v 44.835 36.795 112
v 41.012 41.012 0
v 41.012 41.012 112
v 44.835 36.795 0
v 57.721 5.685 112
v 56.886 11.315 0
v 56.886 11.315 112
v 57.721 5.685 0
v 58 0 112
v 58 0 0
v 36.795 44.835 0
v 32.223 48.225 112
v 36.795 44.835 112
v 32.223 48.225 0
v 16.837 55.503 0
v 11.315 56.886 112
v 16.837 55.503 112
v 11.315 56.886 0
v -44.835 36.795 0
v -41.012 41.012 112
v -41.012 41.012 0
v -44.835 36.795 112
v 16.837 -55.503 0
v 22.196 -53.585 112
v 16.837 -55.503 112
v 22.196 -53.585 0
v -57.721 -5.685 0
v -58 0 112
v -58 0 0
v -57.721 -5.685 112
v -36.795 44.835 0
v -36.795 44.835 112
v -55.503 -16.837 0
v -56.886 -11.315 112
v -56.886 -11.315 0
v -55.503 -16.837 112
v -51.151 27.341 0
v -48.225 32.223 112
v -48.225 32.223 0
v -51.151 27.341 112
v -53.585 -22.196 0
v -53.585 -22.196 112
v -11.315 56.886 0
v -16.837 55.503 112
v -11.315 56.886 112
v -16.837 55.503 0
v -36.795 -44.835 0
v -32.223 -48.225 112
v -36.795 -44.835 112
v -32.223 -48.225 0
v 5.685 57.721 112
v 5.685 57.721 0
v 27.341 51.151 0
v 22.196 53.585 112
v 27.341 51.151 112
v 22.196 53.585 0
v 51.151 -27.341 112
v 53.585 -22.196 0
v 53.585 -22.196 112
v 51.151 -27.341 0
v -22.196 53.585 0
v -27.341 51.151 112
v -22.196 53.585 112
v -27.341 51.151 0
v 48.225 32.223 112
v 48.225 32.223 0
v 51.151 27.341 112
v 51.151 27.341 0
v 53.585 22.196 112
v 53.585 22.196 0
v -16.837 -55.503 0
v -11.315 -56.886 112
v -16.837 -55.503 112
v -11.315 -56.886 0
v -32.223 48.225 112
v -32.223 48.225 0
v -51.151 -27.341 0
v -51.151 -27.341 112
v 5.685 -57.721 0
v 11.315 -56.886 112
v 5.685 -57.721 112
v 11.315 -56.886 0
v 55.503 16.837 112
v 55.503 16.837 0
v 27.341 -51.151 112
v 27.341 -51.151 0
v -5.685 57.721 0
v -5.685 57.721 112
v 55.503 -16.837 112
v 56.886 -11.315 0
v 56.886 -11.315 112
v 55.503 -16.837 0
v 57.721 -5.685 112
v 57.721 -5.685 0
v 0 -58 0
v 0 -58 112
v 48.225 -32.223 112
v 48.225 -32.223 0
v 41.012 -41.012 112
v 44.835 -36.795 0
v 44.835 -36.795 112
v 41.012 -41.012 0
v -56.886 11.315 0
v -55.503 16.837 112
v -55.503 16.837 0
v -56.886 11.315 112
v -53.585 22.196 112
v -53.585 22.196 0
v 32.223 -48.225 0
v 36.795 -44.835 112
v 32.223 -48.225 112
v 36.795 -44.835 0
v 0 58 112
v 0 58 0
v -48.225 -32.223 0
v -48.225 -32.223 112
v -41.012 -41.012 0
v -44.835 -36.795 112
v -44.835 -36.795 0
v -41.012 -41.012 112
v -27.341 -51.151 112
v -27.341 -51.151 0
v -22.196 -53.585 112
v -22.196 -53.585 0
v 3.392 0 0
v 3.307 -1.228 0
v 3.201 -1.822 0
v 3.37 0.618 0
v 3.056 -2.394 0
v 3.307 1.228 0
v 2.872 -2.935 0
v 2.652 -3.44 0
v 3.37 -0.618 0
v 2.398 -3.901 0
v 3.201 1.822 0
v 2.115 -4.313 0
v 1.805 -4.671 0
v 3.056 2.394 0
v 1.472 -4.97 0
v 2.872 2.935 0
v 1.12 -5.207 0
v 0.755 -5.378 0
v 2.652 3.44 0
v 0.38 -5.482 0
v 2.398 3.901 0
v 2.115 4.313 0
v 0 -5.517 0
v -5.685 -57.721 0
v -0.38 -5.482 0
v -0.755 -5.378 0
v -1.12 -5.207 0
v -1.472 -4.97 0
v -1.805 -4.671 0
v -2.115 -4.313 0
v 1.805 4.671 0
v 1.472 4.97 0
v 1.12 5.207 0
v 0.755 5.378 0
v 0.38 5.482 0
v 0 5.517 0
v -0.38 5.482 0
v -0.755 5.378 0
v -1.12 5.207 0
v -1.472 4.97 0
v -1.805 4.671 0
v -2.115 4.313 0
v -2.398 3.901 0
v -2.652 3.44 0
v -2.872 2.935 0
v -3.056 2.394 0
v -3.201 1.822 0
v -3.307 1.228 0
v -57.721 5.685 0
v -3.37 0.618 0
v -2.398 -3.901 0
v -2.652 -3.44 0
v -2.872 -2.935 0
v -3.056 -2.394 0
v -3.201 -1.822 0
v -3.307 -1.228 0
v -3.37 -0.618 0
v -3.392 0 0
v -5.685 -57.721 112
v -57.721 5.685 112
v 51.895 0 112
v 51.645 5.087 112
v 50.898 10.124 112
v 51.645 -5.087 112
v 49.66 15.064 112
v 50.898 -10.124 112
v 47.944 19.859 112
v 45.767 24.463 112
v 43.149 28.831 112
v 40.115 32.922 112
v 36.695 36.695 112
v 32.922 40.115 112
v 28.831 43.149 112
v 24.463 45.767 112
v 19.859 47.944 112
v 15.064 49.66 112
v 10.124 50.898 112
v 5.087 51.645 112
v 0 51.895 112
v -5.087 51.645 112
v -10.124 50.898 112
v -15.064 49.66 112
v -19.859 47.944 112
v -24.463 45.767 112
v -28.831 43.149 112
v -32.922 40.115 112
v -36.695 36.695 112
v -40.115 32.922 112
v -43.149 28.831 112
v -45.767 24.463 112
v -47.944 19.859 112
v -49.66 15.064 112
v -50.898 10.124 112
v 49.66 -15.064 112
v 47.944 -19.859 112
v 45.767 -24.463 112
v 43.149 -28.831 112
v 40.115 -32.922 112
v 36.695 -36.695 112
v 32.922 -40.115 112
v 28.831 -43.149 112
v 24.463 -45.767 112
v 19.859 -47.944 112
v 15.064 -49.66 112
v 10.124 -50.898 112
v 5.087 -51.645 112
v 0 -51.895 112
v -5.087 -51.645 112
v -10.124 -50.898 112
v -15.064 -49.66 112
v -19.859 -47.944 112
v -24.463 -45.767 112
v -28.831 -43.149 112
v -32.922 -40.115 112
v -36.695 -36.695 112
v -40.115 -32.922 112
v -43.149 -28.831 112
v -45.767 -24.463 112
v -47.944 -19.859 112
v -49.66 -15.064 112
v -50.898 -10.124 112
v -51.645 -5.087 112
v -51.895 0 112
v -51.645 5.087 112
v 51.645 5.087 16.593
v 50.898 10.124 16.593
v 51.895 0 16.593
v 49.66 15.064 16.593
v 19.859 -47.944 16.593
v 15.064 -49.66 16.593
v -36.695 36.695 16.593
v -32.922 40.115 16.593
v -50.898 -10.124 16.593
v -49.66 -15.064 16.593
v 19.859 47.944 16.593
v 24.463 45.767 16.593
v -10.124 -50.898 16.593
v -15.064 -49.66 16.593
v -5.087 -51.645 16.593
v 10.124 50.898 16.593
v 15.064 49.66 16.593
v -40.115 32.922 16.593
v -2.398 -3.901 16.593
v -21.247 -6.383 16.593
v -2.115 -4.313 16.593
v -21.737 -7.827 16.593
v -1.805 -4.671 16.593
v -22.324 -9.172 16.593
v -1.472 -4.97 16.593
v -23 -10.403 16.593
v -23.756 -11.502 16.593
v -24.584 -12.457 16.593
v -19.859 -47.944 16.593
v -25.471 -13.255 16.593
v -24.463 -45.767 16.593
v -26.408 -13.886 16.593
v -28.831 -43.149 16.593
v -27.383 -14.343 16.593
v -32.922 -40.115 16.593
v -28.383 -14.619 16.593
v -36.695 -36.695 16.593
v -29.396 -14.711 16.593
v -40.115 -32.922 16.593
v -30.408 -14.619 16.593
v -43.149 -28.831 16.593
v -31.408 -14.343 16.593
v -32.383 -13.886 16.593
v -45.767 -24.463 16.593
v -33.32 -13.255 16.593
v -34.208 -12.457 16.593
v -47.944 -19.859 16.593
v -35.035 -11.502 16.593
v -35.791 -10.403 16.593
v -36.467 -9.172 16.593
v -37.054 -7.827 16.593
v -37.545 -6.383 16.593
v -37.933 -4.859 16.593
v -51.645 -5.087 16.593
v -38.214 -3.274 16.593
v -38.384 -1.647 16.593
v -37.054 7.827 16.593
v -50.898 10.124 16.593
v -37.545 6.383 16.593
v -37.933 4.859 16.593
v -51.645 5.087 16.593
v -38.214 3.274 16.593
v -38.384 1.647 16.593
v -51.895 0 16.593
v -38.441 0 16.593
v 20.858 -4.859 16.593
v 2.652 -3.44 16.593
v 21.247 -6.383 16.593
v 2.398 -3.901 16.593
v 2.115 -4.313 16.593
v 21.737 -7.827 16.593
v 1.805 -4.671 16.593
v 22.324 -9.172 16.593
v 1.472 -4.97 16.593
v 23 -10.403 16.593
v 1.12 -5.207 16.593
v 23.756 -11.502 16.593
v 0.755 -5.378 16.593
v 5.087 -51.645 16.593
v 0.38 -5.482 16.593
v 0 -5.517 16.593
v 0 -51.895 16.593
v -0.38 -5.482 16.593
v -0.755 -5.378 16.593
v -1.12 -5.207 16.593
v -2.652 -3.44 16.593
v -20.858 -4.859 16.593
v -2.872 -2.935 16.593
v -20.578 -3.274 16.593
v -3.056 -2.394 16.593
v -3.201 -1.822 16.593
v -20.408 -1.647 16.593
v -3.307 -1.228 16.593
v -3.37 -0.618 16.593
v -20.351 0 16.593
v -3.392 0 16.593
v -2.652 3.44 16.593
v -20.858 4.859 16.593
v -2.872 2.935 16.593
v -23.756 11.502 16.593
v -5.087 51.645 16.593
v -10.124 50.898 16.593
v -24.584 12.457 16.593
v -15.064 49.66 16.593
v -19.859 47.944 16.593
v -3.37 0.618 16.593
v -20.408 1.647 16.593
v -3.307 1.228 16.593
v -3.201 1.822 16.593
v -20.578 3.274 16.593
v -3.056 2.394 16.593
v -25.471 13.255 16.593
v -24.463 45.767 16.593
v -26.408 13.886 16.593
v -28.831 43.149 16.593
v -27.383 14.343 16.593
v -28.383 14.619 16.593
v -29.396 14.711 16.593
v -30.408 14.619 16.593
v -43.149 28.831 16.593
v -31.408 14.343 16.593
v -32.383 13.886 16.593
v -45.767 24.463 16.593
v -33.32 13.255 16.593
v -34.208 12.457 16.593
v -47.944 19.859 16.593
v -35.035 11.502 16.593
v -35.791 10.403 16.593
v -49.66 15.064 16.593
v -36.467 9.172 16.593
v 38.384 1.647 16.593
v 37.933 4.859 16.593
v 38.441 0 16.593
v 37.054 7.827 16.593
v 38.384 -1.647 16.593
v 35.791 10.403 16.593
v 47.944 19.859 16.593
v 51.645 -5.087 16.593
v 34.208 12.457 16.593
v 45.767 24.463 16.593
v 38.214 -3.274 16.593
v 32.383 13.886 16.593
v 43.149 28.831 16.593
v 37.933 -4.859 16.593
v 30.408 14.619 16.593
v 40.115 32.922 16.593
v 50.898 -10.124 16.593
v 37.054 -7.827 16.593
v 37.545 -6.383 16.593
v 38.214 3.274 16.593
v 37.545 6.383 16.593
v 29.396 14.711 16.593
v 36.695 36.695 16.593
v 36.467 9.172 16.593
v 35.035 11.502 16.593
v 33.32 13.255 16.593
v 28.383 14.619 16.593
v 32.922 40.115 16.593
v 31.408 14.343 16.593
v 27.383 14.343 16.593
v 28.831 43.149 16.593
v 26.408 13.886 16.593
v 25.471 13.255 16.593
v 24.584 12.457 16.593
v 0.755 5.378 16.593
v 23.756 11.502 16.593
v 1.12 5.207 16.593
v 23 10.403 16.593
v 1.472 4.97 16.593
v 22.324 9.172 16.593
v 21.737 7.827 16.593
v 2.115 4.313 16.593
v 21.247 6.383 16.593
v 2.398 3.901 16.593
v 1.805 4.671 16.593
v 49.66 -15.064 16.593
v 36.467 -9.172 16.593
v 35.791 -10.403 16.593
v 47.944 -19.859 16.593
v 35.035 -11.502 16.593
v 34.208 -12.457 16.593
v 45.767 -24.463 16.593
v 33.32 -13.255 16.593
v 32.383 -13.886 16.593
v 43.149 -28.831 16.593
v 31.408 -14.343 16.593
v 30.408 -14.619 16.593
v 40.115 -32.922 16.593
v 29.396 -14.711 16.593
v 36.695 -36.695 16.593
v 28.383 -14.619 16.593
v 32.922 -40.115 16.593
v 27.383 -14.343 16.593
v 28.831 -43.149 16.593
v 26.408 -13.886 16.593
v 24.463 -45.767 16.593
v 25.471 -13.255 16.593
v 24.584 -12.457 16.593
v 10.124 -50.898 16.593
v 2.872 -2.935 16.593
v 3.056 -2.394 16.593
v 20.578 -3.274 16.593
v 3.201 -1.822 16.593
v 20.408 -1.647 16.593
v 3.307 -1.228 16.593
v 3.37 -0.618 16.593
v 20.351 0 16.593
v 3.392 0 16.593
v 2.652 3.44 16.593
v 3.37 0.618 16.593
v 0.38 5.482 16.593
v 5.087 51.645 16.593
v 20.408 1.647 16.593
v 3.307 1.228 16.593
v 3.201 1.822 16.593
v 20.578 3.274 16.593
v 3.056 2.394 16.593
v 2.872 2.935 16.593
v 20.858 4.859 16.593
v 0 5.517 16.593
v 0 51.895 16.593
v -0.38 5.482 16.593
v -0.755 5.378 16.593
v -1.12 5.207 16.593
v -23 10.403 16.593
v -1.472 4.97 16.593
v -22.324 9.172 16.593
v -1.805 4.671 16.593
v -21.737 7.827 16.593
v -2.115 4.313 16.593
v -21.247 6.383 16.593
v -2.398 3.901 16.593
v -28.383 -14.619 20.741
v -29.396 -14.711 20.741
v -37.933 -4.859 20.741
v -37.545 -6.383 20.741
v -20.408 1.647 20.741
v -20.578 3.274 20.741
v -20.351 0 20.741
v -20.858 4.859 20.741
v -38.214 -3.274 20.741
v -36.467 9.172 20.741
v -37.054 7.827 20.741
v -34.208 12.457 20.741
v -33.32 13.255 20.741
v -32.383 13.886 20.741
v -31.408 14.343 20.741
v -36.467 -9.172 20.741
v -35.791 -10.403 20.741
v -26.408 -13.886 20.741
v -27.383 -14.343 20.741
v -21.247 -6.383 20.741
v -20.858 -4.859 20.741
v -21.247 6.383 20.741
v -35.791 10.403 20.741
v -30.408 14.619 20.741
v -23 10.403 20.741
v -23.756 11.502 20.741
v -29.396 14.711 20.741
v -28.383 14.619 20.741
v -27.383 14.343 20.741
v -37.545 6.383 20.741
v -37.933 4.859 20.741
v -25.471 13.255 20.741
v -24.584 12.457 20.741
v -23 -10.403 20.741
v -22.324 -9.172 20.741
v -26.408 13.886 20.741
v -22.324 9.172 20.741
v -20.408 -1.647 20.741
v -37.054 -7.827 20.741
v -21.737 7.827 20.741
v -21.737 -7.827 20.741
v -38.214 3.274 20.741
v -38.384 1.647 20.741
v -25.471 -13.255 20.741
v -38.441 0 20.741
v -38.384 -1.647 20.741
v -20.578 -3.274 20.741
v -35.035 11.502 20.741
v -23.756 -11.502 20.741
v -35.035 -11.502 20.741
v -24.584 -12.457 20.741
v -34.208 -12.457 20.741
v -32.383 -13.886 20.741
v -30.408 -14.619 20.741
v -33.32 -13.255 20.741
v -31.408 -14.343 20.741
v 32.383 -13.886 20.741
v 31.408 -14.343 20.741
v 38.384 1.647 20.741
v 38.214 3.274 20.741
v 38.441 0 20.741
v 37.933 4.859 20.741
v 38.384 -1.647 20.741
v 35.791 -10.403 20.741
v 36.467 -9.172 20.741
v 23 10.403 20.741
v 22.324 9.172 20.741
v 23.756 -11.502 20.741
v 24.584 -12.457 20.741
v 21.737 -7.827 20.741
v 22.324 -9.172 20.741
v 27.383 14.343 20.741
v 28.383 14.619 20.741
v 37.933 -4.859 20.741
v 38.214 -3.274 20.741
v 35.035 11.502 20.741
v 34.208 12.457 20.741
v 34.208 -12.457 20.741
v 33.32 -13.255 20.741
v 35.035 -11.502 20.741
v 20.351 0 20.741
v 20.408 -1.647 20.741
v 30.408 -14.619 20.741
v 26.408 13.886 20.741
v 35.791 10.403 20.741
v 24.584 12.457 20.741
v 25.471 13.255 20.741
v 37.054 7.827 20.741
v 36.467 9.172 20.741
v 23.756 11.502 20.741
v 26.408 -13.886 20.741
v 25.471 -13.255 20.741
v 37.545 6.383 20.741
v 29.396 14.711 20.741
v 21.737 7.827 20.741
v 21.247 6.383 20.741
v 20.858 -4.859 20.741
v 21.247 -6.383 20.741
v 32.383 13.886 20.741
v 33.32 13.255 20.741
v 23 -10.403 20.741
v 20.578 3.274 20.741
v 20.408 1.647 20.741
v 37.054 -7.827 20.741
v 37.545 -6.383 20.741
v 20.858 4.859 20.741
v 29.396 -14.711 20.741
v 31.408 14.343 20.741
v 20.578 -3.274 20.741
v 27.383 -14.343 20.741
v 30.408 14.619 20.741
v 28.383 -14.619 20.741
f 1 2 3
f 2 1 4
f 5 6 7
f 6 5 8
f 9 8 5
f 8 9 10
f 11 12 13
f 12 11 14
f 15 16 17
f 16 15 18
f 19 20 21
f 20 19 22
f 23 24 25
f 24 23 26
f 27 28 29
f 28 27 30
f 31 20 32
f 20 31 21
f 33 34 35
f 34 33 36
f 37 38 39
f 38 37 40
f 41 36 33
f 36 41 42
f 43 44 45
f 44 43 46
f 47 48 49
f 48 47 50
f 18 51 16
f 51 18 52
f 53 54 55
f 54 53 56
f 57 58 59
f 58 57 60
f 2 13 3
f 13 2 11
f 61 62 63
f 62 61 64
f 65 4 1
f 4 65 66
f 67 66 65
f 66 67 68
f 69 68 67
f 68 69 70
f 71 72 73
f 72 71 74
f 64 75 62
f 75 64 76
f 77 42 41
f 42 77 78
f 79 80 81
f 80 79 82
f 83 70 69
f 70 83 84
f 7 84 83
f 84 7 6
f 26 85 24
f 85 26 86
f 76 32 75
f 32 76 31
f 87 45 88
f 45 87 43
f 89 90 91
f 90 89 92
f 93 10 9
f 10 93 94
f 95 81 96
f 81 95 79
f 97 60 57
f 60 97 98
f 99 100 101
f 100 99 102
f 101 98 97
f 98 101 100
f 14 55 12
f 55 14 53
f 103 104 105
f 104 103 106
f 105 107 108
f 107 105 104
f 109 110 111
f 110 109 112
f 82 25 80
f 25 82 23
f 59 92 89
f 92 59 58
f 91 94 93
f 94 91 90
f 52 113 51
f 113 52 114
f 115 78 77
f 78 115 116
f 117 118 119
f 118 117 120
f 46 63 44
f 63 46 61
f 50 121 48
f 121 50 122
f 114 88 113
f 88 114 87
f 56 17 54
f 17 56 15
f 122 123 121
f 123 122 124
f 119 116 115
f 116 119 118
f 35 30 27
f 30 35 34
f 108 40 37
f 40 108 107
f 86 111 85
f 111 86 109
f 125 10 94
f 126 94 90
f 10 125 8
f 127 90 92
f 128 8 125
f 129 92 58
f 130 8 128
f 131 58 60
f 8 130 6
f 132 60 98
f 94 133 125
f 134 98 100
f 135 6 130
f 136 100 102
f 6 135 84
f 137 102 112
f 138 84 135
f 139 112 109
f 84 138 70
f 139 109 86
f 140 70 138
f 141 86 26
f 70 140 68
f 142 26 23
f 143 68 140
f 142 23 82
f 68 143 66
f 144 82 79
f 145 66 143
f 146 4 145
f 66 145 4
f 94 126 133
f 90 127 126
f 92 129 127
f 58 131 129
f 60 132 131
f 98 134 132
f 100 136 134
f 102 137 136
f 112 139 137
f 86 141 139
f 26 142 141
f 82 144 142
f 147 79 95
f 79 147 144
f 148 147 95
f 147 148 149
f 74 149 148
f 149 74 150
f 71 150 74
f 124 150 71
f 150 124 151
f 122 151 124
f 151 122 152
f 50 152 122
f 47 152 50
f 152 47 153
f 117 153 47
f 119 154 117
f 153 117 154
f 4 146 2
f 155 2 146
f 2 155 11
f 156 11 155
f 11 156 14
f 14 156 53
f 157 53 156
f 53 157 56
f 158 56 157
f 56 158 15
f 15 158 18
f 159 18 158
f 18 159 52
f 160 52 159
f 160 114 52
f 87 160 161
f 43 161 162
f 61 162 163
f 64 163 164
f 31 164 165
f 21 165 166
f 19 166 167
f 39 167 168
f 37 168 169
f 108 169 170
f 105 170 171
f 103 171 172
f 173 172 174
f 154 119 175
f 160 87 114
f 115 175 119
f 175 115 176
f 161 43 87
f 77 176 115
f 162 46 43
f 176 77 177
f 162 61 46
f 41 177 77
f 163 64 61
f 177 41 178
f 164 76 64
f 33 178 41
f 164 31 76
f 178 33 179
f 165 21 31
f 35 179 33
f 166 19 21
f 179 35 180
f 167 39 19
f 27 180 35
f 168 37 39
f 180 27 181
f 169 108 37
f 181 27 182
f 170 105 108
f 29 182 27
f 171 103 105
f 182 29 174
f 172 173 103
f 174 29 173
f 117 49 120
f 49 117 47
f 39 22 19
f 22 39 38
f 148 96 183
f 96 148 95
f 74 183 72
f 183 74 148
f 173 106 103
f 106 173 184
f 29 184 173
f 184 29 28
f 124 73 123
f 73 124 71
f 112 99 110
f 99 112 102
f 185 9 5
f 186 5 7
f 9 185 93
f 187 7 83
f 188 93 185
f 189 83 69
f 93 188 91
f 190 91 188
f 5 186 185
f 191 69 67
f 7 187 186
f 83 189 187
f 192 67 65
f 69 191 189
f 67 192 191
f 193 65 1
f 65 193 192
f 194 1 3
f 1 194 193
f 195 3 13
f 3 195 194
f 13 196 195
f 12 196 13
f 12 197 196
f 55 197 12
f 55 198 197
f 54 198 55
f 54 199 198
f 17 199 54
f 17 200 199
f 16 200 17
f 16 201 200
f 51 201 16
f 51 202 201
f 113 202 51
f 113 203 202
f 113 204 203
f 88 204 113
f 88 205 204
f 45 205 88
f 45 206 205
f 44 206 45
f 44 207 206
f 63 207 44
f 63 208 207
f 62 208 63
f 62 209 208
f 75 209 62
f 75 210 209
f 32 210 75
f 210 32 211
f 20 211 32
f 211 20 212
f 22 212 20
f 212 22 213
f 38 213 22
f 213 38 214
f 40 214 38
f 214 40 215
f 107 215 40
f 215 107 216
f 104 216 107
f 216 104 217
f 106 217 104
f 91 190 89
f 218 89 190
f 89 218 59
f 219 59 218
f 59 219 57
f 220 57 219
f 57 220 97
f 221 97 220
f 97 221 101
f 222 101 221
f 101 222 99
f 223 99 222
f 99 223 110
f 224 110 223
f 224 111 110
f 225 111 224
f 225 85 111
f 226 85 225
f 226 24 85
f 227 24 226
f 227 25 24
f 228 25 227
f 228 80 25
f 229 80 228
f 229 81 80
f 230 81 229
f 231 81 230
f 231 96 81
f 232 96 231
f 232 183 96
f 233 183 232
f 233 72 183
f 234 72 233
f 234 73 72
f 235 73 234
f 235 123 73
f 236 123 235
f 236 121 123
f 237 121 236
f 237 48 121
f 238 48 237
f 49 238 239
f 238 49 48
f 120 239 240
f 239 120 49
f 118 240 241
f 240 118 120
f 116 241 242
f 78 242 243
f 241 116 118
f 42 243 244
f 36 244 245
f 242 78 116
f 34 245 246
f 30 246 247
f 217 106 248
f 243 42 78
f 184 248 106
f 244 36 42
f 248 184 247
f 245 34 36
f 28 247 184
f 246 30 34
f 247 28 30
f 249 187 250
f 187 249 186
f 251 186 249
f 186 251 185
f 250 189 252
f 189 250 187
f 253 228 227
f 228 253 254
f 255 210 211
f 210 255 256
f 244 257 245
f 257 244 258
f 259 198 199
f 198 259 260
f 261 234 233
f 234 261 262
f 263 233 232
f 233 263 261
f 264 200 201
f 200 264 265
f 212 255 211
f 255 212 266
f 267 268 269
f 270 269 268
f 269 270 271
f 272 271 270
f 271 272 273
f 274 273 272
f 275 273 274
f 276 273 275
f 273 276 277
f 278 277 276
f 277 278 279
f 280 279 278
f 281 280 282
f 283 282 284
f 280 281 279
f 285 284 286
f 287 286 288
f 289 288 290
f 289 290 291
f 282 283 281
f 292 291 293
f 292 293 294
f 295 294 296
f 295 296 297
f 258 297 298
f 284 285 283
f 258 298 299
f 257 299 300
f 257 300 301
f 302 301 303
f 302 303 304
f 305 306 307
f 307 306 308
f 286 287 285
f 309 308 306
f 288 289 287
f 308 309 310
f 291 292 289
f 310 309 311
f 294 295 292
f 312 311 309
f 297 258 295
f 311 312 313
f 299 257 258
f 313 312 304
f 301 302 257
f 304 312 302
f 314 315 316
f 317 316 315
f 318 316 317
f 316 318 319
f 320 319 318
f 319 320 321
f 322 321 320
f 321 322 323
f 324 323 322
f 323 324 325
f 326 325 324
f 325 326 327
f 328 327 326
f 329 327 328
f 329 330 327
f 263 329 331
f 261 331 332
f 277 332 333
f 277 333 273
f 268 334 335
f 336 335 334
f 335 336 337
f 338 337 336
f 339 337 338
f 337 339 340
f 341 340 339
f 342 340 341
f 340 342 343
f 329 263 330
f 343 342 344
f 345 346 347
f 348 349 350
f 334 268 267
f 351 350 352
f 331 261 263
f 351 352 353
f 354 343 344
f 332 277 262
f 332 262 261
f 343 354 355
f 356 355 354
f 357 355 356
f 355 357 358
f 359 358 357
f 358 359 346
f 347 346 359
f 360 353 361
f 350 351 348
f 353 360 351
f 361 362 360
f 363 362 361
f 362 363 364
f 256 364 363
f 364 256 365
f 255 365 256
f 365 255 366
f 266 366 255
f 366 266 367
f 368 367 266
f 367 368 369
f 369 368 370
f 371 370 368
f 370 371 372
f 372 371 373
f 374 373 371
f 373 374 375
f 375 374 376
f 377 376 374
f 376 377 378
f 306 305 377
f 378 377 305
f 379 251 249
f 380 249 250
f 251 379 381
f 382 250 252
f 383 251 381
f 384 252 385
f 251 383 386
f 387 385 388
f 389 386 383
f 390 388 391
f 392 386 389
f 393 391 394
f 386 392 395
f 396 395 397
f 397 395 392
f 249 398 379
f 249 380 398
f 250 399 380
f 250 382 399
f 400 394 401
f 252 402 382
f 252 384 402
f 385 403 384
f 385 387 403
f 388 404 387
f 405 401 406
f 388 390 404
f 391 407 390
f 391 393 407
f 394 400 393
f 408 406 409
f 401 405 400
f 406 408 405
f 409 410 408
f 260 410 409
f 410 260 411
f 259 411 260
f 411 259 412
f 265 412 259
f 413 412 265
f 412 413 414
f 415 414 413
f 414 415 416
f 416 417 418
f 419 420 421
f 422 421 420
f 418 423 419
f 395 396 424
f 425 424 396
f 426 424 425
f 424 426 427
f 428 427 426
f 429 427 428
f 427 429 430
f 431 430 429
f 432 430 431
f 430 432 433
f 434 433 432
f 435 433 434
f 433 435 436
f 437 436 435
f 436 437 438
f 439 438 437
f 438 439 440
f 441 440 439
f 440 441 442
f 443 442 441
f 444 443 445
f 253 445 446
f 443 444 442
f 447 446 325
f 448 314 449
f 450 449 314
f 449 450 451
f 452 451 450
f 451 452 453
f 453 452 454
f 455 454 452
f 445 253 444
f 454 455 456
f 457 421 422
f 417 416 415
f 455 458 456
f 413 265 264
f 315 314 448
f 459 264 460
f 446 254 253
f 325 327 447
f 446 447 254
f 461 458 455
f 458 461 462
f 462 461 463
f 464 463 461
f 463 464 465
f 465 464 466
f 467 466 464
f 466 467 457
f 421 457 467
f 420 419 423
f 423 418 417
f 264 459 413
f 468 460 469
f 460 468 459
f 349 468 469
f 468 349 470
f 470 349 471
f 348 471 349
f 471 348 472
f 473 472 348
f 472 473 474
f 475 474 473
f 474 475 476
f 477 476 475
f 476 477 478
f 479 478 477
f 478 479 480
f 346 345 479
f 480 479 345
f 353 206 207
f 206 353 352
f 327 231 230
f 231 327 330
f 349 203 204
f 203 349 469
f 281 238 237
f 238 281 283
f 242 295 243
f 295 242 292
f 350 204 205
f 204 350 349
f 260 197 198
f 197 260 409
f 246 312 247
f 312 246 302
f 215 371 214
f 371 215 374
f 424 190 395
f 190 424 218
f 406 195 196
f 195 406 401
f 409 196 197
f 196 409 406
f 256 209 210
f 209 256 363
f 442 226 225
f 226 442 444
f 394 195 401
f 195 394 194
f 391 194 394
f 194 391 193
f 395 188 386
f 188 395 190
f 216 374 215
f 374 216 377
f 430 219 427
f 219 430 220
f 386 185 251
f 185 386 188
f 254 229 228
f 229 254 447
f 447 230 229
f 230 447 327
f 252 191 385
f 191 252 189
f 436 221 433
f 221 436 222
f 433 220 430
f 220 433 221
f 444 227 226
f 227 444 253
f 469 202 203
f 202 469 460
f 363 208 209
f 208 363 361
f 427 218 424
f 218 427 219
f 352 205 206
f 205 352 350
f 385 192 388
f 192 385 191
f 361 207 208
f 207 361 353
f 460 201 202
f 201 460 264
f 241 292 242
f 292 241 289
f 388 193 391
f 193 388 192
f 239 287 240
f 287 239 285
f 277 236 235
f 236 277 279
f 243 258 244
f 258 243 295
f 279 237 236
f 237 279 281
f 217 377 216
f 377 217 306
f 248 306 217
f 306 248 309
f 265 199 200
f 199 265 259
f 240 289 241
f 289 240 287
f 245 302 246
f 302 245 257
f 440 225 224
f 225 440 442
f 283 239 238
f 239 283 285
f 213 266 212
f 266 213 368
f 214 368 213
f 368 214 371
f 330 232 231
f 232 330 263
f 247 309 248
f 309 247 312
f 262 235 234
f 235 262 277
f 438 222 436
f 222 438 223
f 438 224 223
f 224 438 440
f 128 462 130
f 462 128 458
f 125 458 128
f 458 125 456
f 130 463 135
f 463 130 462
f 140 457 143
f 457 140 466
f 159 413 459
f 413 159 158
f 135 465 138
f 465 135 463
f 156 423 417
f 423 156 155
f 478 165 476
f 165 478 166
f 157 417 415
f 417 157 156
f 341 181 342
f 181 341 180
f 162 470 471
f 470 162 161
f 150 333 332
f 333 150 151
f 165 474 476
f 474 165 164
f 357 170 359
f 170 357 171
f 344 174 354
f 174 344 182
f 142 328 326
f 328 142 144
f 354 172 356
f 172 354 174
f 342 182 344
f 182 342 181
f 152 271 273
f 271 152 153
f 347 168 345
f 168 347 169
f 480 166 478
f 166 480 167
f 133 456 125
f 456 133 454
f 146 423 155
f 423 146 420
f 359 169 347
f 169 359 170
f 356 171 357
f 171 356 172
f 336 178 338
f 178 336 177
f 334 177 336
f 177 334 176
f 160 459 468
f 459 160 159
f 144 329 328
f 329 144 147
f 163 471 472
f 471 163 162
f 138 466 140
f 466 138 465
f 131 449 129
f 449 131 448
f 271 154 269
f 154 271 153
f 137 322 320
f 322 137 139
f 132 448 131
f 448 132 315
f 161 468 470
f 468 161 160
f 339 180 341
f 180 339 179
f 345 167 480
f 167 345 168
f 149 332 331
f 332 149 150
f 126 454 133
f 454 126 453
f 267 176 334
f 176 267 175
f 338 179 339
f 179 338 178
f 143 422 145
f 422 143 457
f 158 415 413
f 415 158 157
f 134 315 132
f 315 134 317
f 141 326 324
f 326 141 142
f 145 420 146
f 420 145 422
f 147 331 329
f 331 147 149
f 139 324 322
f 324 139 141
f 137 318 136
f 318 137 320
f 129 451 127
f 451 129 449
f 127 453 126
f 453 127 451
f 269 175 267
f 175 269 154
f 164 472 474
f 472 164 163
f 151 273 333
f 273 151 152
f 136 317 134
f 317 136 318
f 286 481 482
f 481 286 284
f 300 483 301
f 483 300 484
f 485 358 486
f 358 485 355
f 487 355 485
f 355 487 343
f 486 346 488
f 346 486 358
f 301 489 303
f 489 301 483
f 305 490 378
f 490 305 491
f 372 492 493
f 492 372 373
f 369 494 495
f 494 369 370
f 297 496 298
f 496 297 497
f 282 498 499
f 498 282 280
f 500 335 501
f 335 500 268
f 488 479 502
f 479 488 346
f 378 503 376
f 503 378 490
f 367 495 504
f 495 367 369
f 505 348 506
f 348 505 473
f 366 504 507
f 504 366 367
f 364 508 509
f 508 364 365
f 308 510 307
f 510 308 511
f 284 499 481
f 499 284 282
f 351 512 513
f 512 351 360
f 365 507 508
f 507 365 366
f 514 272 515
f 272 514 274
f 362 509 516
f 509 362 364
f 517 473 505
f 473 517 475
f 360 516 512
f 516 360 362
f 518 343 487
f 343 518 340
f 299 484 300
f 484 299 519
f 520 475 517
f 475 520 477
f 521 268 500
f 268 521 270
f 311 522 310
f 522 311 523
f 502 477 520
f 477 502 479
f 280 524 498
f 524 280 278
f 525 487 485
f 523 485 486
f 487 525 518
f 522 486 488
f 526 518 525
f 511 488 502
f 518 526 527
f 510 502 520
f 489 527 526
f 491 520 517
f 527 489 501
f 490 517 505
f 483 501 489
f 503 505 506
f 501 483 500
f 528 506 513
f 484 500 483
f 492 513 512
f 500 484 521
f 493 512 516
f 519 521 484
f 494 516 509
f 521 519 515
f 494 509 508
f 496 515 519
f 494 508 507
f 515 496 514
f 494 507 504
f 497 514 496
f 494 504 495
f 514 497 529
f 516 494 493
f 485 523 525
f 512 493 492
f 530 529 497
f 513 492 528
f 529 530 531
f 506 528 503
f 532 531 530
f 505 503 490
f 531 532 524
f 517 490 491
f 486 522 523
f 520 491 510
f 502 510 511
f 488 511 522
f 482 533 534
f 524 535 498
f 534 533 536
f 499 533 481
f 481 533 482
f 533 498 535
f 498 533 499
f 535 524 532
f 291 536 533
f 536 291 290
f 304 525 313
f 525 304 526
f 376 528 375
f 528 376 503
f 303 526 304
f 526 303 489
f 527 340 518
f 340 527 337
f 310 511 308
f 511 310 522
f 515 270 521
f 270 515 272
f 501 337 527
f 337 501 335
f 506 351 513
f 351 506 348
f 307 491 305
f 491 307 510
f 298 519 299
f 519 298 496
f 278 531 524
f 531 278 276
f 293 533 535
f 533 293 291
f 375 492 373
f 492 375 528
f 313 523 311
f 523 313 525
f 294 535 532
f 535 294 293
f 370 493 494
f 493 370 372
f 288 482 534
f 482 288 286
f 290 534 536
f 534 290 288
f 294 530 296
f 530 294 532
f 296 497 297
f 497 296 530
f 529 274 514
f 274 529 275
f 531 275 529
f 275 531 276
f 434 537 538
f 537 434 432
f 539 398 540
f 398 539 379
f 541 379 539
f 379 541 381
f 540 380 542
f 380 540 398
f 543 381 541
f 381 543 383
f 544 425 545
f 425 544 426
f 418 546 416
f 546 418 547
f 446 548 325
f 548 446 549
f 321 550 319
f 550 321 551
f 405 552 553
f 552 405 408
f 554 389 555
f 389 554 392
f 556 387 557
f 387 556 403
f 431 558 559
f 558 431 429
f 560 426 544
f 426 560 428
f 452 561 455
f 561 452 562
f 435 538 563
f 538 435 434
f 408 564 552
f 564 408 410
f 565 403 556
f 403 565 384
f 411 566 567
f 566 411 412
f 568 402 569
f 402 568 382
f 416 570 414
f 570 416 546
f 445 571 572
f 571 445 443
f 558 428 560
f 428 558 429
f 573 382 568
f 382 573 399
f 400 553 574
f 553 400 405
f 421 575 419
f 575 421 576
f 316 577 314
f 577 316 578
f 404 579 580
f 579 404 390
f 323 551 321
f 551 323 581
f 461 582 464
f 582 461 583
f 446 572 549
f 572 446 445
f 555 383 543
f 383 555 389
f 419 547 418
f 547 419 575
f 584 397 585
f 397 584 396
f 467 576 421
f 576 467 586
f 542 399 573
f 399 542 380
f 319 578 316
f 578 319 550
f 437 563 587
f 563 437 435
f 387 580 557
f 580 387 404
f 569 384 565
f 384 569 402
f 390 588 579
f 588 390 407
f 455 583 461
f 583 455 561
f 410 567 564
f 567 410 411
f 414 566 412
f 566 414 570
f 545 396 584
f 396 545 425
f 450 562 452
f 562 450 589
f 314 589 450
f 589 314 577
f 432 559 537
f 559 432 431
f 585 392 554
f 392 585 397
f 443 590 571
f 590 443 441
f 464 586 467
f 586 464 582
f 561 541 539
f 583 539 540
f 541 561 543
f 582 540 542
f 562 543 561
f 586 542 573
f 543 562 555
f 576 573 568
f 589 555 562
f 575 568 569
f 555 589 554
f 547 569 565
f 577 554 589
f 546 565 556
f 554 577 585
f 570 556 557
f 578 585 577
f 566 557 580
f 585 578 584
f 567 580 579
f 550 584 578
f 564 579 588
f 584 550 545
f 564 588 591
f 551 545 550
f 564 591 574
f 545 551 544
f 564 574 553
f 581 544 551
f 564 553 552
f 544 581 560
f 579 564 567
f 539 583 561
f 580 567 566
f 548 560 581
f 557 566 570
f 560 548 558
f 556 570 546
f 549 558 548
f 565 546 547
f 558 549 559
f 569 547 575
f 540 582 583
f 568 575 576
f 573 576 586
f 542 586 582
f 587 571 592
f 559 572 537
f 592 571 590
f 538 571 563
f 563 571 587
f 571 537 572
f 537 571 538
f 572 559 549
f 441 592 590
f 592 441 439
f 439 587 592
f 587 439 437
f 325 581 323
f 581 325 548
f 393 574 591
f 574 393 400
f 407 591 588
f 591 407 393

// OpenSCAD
// Bonsai Display Pot | 盆景展示盆 | original parametric CAD prototype
// CAD uses millimeters/Z-up; target dimensions [width,depth,height] mm.
// Product hypothesis only; full slicer/manifold and real-print checks required.
use <lib/commerce_forms.scad>
resize([116,116,112],auto=false)
    commercial_form(family="planter",variant=4);
